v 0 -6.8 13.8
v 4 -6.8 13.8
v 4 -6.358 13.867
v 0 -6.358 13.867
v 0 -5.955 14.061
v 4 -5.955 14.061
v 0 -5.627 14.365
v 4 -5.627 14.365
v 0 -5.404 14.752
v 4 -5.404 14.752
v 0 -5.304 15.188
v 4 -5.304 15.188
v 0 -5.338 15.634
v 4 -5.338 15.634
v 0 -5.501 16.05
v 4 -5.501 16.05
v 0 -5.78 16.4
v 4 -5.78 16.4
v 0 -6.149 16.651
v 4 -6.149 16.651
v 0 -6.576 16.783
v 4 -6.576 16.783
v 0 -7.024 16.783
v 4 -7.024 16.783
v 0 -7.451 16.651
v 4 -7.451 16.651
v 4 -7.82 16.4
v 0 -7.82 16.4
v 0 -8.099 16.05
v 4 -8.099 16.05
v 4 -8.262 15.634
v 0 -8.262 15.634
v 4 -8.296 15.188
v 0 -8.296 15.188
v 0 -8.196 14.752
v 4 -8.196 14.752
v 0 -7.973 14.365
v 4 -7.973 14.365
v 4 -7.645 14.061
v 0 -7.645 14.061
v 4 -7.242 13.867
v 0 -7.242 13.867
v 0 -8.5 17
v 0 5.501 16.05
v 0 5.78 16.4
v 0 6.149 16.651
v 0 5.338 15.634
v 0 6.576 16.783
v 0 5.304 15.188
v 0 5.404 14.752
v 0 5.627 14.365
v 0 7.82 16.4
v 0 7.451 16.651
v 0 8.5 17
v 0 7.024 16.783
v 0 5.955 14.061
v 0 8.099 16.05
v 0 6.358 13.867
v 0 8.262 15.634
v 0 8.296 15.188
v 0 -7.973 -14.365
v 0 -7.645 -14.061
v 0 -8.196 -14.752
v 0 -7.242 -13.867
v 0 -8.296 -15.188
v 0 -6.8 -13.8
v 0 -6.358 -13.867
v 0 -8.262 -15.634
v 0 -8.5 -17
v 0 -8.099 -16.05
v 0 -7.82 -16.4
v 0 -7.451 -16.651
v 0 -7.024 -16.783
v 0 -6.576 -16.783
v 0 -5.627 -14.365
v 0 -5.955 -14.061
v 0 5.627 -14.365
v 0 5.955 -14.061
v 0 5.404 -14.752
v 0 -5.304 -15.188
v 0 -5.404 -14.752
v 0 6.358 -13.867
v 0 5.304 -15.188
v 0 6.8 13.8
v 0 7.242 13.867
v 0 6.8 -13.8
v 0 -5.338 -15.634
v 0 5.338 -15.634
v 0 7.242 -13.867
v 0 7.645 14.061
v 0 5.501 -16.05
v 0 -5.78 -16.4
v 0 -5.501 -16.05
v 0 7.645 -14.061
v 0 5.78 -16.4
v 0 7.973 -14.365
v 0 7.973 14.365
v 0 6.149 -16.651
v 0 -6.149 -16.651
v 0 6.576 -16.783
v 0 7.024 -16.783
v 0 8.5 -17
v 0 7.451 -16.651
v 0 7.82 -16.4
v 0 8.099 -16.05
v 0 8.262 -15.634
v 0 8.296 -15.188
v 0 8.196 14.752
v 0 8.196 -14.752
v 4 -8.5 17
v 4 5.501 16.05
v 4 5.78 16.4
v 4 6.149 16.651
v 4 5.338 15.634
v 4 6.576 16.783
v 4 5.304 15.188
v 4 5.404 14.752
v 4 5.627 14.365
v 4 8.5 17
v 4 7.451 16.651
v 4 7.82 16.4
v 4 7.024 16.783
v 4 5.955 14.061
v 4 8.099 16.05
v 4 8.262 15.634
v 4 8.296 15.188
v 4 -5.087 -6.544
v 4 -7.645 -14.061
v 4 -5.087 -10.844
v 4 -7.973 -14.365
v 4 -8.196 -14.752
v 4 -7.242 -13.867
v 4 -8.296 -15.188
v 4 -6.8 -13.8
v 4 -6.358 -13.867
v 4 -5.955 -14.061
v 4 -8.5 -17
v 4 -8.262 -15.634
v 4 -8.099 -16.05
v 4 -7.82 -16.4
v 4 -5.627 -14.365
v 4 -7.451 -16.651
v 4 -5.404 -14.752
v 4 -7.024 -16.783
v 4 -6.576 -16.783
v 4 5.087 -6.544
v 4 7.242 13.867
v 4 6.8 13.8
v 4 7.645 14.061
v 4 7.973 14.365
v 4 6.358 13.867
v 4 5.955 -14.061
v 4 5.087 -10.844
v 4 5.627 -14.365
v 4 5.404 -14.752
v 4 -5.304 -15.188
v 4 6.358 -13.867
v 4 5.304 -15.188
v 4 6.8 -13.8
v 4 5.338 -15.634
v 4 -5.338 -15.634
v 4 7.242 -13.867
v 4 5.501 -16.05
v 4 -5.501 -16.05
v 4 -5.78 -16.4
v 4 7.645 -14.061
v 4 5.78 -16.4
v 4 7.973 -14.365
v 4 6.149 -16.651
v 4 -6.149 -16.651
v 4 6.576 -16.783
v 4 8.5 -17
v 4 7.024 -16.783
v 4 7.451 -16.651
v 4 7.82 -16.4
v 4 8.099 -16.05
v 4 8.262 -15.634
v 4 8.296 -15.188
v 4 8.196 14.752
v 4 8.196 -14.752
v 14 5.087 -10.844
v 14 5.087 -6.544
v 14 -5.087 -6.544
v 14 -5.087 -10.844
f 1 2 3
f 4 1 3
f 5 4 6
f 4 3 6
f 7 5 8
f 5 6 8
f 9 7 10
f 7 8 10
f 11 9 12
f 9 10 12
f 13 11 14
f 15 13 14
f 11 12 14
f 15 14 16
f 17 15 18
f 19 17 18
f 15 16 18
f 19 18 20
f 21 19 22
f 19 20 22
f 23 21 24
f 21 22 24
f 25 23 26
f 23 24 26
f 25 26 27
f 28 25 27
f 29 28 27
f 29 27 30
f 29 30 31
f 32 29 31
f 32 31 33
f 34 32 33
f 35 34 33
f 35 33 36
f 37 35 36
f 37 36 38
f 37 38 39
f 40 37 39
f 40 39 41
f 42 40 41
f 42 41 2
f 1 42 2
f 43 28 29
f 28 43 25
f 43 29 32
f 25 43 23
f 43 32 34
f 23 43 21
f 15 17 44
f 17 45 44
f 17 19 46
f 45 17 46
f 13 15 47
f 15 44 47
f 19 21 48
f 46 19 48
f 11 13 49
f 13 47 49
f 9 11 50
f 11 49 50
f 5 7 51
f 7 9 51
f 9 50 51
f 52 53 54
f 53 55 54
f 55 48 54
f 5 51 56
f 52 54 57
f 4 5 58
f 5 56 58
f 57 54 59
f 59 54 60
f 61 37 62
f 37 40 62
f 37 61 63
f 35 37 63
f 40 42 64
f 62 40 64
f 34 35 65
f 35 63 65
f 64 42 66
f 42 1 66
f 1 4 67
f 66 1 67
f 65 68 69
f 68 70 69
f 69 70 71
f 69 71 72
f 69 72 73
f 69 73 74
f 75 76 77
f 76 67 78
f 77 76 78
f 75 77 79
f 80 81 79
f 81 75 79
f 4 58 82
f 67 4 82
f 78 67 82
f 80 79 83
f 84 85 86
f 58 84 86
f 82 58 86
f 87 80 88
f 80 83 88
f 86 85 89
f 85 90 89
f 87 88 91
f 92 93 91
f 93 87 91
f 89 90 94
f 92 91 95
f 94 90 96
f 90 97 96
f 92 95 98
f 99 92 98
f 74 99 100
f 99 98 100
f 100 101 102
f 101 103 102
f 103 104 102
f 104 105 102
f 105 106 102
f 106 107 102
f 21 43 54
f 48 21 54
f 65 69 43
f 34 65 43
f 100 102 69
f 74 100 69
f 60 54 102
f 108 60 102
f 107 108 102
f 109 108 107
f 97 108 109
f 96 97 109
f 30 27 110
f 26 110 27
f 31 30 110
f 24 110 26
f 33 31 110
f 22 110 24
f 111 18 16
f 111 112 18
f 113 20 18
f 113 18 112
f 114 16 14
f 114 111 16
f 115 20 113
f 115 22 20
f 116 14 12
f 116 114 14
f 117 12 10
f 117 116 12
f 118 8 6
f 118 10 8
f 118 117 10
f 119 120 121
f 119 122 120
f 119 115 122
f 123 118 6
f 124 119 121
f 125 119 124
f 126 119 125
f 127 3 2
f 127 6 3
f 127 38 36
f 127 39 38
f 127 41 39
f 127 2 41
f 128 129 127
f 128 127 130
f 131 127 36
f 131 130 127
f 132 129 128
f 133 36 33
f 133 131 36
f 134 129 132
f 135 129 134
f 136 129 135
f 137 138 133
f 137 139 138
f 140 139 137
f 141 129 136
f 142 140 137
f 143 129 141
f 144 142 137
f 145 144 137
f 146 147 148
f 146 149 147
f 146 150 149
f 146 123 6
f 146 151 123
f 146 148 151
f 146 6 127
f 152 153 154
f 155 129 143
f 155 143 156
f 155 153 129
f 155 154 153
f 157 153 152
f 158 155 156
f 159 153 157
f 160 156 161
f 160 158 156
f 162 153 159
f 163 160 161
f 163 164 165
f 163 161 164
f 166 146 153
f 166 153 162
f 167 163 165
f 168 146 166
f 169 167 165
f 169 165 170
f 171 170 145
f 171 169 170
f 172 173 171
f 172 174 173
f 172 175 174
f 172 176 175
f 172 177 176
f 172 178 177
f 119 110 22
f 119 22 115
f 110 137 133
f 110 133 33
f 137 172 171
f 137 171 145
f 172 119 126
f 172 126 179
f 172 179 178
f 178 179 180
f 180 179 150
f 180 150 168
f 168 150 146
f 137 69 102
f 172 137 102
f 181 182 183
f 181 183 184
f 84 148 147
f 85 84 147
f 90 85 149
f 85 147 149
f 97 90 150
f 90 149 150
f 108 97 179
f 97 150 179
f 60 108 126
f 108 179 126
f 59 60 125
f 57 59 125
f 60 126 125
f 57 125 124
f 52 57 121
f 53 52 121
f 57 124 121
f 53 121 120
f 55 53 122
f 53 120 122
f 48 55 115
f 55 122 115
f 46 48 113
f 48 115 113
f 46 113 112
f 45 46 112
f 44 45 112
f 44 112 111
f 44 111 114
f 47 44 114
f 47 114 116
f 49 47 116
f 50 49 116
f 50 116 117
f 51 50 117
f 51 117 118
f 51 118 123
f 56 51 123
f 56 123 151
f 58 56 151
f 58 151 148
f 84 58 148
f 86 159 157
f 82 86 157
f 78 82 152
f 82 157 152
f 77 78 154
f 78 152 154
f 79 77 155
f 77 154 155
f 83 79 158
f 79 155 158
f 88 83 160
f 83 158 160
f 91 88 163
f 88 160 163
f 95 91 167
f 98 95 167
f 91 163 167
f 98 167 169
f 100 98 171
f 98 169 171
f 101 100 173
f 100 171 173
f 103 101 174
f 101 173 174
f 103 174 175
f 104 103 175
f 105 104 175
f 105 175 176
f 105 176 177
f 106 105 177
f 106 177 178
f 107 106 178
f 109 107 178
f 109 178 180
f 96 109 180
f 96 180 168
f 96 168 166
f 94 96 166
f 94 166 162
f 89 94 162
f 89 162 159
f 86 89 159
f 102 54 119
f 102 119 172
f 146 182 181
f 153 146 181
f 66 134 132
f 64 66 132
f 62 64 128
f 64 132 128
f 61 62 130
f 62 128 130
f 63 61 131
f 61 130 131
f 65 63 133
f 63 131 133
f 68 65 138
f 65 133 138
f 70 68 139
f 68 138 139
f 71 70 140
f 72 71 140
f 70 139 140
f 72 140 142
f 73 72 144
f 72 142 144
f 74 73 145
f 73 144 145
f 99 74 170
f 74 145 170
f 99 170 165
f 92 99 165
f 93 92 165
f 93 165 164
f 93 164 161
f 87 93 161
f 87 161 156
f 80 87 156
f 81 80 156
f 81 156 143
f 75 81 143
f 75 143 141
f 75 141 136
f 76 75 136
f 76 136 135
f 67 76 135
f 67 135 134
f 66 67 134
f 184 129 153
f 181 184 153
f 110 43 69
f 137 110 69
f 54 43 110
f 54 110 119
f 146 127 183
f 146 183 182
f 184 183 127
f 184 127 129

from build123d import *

# Parameters (mm, degrees)
SKETCH1_W           = 34
SKETCH1_H           = 17
BOSS_EXTRUDE1_DEPTH = 4
SKETCH2_R           = 1.5
CUT_EXTRUDE1_DEPTH  = 20.4229246
SKETCH3_W           = 4.299826773
SKETCH3_H           = 10.17393153
BOSS_EXTRUDE2_DEPTH = 10


with BuildPart() as part:
    # Sketch1 → Boss-Extrude1 (new body)
    with BuildSketch(Plane(origin=(0, 0, 0), x_dir=(0, 0, -1), z_dir=(1, 0, 0))):
        Rectangle(SKETCH1_W, SKETCH1_H)
    extrude(amount=BOSS_EXTRUDE1_DEPTH)

    # Sketch2 → Cut-Extrude1 (cut, through all)
    with BuildSketch(Plane(origin=(4, 0, 0), x_dir=(0, 0, -1), z_dir=(1, 0, 0))):
        with Locations((-15.3, 6.8)):
            Circle(SKETCH2_R)
        with Locations((-15.3, -6.8)):
            Circle(SKETCH2_R)
        with Locations(Location((15.3, -6.8, 0), (0, 0, 180))):
            Circle(SKETCH2_R)
        with Locations(Location((15.3, 6.8, 0), (0, 0, 180))):
            Circle(SKETCH2_R)
    extrude(amount=-CUT_EXTRUDE1_DEPTH, mode=Mode.SUBTRACT)

    # Sketch3 → Boss-Extrude2 (add)
    with BuildSketch(Plane(origin=(4, 0, 0), x_dir=(0, 0, -1), z_dir=(1, 0, 0))):
        with Locations((8.693678476, 0)):
            Rectangle(SKETCH3_W, SKETCH3_H)
    extrude(amount=BOSS_EXTRUDE2_DEPTH)


solid = part.part
